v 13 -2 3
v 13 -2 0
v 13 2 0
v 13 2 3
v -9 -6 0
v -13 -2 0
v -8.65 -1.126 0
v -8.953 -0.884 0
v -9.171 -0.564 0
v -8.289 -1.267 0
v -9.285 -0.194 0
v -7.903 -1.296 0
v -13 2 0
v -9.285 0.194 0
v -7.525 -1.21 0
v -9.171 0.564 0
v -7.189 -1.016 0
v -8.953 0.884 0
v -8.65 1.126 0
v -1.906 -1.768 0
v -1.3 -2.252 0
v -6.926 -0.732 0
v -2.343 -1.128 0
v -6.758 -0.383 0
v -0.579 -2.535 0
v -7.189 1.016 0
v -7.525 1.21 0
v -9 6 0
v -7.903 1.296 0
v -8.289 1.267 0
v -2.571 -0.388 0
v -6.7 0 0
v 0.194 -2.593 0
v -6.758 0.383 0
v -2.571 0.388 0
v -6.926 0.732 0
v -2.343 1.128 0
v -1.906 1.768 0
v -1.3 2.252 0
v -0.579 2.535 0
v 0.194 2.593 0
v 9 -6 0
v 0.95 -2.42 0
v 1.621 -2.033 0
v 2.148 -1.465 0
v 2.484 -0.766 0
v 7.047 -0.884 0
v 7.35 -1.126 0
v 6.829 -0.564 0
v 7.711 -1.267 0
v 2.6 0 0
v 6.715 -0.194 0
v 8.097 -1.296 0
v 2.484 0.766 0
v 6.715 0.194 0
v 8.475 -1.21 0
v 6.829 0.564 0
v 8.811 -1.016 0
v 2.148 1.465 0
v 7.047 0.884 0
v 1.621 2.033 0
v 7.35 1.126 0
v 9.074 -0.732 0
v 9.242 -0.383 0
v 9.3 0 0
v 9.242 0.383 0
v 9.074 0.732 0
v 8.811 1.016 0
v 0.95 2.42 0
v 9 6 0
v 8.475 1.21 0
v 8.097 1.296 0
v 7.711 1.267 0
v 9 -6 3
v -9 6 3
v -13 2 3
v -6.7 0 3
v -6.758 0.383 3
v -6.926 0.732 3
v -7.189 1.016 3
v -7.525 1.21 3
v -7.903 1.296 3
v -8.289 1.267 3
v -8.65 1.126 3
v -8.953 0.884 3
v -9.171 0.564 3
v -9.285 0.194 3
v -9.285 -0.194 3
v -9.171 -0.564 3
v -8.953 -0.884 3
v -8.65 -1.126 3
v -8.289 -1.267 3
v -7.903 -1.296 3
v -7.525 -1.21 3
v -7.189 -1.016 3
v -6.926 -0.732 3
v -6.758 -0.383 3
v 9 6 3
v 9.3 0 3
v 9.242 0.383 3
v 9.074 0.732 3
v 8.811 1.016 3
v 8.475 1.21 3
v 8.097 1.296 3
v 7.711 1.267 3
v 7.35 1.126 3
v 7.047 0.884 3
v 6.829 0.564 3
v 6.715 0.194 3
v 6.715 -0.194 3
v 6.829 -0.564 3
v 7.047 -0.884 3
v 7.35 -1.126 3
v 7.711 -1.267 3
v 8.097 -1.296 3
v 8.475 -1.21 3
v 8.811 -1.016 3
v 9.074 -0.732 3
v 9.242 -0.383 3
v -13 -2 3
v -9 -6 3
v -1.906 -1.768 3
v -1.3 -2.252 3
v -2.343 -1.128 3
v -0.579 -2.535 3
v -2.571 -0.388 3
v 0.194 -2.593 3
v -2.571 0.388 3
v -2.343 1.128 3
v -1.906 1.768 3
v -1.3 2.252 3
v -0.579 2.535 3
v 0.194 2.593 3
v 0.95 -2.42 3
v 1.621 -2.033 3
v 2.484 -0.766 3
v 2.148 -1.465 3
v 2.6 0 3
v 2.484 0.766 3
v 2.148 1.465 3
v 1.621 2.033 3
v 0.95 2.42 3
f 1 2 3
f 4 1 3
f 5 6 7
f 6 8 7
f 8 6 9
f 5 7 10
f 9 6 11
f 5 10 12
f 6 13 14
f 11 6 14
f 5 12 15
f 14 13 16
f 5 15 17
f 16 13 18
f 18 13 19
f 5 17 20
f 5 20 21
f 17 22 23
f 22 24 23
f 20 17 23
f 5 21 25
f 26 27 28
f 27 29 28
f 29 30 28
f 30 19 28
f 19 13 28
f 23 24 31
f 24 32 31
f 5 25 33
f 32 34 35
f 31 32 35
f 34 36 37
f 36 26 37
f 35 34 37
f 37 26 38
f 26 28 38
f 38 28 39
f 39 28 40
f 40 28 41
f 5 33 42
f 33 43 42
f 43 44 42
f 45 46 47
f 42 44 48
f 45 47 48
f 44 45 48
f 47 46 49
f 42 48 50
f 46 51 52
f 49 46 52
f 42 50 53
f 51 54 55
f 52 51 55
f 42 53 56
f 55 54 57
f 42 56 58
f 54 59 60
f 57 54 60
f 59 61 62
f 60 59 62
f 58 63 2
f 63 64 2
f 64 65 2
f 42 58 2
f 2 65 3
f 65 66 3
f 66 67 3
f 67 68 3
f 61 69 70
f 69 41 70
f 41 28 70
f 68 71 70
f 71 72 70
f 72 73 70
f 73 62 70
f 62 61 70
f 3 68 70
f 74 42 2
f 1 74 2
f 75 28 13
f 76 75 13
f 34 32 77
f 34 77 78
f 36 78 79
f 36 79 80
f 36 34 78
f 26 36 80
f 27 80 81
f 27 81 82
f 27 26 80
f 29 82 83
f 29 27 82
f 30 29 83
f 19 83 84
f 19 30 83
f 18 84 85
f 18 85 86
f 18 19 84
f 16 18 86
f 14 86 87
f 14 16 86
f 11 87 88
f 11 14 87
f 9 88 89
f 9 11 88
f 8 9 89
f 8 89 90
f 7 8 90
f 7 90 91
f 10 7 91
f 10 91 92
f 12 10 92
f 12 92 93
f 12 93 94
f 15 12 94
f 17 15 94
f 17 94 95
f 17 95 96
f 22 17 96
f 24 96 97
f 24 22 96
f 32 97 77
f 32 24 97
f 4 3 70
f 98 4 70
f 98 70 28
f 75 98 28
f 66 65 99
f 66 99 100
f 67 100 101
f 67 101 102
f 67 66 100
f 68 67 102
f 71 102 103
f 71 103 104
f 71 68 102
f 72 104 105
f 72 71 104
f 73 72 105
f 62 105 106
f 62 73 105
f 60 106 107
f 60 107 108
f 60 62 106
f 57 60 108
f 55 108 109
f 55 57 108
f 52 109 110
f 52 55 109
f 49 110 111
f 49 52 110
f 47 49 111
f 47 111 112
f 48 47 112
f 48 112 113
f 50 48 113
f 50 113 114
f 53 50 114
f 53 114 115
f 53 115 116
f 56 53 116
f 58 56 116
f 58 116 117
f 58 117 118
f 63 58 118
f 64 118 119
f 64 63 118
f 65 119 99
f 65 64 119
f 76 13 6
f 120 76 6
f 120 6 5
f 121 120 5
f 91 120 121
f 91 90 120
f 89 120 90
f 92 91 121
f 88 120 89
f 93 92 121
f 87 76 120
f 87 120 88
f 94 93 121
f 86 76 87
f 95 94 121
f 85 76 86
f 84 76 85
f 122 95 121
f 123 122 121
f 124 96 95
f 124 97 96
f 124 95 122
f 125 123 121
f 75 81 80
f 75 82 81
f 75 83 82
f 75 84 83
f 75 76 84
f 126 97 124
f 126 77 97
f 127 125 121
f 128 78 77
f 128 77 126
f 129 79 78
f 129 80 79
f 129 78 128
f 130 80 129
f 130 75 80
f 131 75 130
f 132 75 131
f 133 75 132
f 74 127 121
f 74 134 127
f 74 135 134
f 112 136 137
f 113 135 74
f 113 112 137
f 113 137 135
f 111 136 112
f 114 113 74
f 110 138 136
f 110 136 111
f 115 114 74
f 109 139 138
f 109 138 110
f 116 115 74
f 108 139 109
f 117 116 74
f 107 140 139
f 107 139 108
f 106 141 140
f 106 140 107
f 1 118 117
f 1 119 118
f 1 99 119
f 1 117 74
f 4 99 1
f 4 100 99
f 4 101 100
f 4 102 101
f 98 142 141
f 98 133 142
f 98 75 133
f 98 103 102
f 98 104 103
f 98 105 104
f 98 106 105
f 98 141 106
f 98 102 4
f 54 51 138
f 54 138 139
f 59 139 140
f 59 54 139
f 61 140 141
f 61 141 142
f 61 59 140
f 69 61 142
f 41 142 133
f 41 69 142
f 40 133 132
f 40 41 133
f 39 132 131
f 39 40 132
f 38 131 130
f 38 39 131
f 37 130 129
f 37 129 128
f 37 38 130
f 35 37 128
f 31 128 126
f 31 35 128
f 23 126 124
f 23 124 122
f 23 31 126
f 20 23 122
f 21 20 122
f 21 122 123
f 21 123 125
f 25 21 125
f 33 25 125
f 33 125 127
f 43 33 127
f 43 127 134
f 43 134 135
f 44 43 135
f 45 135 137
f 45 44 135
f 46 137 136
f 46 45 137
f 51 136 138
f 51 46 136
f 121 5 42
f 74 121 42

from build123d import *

# Parameters (mm, degrees)
SKETCH_1_R    = 2.6
SKETCH_1_R_2  = 1.3
M5_M2P5_DEPTH = 3


with BuildPart() as part:
    # 草图1 → M5转接毂_双M2p5折叠轴孔 (new body)
    with BuildSketch(Plane.XY):
        Polygon((-9, -6), (9, -6), (13, -2), (13, 2), (9, 6), (-9, 6), (-13, 2), (-13, -2), align=None)
        Circle(SKETCH_1_R, mode=Mode.SUBTRACT)
        with Locations((-8, 0)):
            Circle(SKETCH_1_R_2, mode=Mode.SUBTRACT)
        with Locations((8, 0)):
            Circle(SKETCH_1_R_2, mode=Mode.SUBTRACT)
    extrude(amount=M5_M2P5_DEPTH)


solid = part.part
